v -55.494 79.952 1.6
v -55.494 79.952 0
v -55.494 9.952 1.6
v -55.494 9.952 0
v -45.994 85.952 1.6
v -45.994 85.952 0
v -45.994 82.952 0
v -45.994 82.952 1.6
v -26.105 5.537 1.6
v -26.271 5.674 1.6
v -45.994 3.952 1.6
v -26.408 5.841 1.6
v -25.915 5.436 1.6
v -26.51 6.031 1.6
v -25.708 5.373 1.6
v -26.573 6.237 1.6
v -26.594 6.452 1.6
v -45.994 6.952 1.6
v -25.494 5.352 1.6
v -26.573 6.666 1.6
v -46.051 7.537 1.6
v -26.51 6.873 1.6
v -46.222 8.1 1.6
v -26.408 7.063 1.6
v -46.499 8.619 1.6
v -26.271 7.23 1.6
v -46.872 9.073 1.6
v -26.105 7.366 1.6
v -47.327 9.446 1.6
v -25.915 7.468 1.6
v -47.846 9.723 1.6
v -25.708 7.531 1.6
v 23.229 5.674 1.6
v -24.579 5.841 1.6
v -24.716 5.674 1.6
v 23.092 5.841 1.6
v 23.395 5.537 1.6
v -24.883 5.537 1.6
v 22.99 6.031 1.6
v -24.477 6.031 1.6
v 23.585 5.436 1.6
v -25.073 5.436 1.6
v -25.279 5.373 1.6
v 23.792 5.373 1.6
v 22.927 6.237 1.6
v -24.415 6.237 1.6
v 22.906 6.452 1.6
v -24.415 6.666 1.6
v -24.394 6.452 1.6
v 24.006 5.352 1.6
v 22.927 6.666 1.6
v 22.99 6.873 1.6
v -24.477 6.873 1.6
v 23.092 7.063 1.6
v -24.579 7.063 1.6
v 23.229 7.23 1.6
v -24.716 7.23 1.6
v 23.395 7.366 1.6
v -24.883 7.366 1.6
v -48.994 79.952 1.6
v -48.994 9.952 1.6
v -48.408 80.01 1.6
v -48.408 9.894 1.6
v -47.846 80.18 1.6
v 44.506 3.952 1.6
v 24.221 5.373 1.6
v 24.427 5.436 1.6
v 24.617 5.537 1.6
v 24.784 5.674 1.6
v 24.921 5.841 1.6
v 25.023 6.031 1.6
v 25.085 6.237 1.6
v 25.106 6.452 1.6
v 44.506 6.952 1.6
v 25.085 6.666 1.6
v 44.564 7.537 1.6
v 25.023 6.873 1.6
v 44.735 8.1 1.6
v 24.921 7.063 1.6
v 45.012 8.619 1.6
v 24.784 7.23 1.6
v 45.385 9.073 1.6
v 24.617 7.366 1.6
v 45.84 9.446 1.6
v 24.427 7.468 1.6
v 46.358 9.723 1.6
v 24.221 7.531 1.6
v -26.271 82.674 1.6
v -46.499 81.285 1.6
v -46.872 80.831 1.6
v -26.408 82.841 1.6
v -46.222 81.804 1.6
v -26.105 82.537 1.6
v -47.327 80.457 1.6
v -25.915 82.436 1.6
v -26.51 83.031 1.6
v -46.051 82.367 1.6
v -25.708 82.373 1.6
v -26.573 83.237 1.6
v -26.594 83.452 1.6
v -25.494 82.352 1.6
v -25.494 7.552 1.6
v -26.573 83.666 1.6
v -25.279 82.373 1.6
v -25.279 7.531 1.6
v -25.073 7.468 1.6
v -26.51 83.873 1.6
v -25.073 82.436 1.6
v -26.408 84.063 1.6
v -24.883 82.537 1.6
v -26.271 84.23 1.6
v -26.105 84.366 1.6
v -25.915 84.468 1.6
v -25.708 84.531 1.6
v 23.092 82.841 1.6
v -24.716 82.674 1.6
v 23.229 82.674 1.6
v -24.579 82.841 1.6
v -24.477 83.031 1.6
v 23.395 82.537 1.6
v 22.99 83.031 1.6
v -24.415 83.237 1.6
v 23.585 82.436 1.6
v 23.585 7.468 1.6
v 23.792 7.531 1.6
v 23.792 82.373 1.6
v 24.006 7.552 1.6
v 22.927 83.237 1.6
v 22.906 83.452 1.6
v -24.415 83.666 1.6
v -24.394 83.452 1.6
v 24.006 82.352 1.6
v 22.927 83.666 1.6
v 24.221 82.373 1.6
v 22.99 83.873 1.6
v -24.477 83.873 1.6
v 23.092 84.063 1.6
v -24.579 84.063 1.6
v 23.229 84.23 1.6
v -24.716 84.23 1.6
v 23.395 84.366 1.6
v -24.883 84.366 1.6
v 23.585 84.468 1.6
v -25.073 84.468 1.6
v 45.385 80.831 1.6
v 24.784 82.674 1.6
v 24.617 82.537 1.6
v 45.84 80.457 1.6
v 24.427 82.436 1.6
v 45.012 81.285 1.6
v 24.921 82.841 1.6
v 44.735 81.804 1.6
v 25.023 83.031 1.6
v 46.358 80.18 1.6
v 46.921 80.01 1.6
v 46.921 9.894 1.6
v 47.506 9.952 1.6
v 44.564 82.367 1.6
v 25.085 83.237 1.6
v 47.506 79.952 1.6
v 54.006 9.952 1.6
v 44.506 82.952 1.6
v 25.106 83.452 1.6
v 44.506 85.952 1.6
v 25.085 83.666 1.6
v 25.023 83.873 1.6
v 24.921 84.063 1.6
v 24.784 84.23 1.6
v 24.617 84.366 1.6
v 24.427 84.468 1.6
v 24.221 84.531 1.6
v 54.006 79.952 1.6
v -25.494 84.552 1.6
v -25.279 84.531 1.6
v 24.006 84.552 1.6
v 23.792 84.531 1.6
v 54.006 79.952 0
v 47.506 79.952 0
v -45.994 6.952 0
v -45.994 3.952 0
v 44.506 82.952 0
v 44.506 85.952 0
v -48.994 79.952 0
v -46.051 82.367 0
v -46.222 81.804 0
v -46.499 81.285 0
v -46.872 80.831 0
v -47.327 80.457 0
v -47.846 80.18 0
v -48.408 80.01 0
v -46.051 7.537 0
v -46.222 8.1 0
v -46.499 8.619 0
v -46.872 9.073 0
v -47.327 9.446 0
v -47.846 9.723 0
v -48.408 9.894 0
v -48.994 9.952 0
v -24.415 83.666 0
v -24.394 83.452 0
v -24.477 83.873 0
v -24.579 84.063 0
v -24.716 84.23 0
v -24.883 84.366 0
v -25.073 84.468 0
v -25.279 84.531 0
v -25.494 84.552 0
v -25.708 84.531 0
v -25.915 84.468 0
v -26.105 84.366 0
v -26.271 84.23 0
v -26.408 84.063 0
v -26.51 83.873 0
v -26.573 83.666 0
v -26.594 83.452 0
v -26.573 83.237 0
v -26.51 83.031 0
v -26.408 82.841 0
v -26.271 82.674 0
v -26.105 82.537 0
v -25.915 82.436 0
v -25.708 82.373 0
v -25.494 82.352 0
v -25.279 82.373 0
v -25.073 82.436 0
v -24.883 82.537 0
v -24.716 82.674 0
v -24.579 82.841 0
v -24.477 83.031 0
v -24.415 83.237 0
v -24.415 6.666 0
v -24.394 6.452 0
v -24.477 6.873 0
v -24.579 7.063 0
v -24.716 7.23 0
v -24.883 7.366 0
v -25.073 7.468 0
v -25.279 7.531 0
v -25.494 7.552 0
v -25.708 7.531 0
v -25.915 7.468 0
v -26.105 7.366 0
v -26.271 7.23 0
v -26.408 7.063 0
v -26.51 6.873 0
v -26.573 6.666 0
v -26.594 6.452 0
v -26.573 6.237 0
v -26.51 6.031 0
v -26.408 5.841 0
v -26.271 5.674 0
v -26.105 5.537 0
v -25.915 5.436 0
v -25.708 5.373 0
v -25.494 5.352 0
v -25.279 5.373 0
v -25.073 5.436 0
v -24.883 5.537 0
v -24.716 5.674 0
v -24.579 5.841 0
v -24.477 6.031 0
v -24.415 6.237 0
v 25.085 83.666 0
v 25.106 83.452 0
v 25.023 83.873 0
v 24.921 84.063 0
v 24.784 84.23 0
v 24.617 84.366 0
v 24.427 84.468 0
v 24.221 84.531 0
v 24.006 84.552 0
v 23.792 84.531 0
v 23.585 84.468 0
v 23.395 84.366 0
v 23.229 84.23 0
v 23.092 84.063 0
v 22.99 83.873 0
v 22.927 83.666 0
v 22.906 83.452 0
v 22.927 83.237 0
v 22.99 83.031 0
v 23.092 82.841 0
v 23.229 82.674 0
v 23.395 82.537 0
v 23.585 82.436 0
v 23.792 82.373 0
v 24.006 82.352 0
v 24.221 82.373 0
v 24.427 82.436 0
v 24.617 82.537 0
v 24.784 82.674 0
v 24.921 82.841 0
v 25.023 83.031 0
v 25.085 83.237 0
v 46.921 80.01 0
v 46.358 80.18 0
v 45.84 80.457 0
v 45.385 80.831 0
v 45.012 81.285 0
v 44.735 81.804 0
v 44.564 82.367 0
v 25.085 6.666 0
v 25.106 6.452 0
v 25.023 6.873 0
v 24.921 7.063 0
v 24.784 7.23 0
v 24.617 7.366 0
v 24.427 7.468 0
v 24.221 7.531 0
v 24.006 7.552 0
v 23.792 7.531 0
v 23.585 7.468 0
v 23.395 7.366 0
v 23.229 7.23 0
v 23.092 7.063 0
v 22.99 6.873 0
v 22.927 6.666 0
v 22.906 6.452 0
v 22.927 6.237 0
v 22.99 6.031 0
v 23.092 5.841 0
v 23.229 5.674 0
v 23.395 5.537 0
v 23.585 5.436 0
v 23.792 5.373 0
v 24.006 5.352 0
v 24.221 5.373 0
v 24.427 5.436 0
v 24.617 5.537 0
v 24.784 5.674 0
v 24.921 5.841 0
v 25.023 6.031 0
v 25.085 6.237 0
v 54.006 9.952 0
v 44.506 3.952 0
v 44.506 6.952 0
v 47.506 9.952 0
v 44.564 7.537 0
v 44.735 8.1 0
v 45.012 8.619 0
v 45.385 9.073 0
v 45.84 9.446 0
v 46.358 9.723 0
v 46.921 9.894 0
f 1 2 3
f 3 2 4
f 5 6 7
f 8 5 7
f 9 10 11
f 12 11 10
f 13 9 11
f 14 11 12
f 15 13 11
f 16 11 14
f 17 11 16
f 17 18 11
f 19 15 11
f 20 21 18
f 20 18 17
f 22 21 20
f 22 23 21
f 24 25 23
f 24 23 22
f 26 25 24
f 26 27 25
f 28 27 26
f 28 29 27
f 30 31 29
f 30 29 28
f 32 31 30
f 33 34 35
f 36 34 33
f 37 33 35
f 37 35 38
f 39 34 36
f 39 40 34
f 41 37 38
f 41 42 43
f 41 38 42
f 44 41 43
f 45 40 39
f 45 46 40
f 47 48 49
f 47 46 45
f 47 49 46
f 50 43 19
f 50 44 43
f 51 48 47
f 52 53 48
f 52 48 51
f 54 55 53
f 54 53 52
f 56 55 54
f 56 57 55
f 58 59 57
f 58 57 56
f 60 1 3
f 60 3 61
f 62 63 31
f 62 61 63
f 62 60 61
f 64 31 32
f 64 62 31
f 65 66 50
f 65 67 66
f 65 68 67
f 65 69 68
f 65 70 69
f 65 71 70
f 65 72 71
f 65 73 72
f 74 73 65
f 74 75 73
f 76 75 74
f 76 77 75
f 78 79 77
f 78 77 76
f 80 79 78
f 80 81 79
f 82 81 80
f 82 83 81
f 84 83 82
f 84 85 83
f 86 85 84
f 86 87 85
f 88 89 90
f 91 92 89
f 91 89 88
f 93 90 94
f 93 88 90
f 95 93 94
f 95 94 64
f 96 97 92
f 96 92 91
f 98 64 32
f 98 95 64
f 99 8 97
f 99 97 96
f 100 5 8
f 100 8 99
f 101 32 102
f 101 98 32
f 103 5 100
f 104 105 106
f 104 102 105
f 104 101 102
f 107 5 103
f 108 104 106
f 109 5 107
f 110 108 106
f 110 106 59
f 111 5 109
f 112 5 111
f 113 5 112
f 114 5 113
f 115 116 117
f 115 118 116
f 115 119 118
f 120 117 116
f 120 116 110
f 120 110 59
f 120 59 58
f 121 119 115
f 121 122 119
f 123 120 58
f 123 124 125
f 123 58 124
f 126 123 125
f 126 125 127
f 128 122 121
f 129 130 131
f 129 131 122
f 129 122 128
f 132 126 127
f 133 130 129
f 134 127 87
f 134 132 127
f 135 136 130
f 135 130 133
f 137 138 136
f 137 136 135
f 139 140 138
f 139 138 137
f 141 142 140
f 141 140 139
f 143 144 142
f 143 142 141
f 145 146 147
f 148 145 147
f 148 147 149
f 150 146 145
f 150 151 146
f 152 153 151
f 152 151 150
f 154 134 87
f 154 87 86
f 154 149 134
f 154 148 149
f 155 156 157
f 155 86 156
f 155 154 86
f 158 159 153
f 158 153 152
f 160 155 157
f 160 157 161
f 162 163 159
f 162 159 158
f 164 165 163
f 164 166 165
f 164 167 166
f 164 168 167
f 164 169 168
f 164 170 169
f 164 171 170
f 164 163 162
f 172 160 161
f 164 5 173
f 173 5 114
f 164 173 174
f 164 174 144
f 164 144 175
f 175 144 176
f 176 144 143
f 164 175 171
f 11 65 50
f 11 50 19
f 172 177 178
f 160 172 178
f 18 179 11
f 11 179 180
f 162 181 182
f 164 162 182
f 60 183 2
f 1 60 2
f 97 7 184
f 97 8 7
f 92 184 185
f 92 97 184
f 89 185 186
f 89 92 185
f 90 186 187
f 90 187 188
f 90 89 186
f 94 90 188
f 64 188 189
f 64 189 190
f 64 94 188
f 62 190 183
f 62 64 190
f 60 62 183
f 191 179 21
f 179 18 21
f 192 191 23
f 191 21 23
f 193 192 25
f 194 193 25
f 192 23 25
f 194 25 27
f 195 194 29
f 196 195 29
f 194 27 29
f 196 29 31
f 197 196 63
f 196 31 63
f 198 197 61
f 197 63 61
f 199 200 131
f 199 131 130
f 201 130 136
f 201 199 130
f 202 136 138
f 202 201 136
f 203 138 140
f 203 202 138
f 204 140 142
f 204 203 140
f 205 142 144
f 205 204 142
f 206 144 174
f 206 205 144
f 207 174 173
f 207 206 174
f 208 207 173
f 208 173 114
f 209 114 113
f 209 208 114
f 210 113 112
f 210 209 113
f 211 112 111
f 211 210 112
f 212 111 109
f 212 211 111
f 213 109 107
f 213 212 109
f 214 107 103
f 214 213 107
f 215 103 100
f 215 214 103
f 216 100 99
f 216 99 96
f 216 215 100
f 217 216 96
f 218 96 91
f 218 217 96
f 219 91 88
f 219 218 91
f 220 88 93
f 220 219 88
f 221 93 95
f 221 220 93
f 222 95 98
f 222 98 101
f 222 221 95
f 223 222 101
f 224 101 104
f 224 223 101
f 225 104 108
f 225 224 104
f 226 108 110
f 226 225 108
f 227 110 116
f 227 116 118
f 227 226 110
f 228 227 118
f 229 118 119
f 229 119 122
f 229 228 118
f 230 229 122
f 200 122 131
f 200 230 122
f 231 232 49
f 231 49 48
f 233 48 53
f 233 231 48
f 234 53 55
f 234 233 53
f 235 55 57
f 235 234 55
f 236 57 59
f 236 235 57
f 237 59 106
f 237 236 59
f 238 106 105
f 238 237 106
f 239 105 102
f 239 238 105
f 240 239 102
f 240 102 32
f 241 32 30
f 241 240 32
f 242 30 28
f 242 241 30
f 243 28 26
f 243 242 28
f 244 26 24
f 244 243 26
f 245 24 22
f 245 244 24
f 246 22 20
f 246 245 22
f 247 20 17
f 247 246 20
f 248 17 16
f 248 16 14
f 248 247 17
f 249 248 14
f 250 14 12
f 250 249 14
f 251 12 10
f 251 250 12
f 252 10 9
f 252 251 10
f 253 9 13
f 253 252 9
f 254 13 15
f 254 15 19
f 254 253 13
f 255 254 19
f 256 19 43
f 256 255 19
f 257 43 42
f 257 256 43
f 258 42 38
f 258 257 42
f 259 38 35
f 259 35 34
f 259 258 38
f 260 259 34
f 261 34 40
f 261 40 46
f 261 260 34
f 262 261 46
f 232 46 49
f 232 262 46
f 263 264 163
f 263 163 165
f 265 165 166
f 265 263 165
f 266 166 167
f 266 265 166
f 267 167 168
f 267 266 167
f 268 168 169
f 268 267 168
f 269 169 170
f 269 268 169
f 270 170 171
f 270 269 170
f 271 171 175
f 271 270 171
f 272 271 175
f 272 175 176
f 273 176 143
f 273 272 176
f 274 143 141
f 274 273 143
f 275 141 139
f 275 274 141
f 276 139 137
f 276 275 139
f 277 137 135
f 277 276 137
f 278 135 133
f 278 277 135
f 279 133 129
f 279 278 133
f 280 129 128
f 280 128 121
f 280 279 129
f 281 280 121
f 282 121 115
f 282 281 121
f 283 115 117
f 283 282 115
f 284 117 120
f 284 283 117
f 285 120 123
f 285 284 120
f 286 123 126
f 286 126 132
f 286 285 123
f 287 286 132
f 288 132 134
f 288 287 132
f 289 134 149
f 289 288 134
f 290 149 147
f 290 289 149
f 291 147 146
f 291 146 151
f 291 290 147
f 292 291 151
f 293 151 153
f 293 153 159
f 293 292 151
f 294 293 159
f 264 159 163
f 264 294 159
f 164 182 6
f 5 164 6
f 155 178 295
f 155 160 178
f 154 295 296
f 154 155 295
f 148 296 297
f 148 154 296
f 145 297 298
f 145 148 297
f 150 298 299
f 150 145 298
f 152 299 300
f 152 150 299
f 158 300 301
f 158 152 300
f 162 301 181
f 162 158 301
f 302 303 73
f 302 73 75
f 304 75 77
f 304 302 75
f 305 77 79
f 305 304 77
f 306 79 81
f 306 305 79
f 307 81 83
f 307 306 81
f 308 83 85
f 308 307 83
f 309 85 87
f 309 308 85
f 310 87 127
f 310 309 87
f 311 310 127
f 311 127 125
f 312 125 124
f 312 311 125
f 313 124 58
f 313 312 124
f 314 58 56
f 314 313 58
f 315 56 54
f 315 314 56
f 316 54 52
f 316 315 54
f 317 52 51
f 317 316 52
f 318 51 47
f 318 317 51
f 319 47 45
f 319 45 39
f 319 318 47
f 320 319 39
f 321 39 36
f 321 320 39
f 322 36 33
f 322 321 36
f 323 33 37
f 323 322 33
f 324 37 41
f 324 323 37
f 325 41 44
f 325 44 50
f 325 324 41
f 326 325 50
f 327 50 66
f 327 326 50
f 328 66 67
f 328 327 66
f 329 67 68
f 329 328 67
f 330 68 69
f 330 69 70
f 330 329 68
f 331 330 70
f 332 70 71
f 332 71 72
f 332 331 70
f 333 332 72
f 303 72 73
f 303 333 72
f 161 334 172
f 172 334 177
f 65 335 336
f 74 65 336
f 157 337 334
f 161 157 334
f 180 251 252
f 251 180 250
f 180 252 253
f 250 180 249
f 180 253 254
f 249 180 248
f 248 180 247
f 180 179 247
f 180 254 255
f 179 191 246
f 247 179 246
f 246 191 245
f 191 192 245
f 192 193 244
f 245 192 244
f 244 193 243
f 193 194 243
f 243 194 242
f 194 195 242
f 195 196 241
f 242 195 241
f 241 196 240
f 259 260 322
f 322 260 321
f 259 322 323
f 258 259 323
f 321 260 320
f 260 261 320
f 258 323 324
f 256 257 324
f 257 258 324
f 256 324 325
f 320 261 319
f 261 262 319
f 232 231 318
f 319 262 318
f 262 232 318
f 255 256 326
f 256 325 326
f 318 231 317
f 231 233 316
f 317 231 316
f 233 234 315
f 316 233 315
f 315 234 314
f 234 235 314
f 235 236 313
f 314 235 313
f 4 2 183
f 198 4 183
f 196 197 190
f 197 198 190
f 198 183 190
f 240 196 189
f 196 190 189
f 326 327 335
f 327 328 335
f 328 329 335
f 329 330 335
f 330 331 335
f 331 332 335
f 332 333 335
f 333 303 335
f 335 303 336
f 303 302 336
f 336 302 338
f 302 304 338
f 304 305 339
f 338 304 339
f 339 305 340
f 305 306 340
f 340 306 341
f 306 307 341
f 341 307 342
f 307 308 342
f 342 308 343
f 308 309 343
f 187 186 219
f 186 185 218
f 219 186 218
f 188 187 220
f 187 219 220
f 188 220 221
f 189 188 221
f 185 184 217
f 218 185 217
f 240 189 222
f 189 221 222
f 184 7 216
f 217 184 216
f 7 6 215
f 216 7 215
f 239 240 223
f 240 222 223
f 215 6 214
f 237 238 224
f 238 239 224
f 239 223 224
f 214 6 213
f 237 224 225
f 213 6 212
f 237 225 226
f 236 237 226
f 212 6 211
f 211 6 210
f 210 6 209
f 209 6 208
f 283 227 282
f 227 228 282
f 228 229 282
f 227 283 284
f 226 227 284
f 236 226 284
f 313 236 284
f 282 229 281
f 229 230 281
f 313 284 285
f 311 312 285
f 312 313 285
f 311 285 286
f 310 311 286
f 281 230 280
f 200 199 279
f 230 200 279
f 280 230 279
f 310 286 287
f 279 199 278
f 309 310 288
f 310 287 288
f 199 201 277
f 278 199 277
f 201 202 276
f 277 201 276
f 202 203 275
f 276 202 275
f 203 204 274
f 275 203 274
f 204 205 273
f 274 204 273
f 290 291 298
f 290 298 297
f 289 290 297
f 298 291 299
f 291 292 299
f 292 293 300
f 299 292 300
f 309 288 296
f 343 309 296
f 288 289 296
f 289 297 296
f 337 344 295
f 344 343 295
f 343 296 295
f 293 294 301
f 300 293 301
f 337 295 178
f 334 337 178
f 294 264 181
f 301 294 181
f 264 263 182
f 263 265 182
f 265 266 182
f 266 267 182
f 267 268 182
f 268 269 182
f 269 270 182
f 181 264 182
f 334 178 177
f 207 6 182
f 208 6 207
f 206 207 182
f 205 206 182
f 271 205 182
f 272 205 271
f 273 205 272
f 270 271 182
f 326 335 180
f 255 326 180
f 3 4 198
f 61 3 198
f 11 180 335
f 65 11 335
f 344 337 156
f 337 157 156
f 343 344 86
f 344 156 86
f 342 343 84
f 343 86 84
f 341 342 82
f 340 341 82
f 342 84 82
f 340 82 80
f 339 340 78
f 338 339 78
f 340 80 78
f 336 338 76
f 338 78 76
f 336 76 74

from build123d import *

# Parameters (mm, degrees)
SKETCH1_R           = 1.1
BOSS_EXTRUDE1_DEPTH = 1.6
FILLET1_R           = 3


with BuildPart() as part:
    # Sketch1 → Boss-Extrude1 (new body)
    with BuildSketch(Plane.XY):
        Polygon((54.006358498, 79.95185693), (44.506358498, 79.95185693), (44.506358498, 85.95185693), (-45.993641502, 85.95185693), (-45.993641502, 79.95185693), (-55.493641502, 79.95185693), (-55.493641502, 9.95185693), (-45.993641502, 9.95185693), (-45.993641502, 3.95185693), (44.506358498, 3.95185693), (44.506358498, 9.95185693), (54.006358498, 9.95185693), align=None)
        with Locations((-25.493641502, 83.45185693)):
            Circle(SKETCH1_R, mode=Mode.SUBTRACT)
        with Locations((24.006358498, 83.45185693)):
            Circle(SKETCH1_R, mode=Mode.SUBTRACT)
        with Locations((24.006358498, 6.45185693)):
            Circle(SKETCH1_R, mode=Mode.SUBTRACT)
        with Locations((-25.493641502, 6.45185693)):
            Circle(SKETCH1_R, mode=Mode.SUBTRACT)
    extrude(amount=BOSS_EXTRUDE1_DEPTH)

    # Fillet1
    fillet1_edges = [part.edges().sort_by_distance(p)[0] for p in [
        (44.506358498, 9.95185693, 0.8),
        (-45.993641502, 9.95185693, 0.8),
        (-45.993641502, 79.95185693, 0.8),
        (44.506358498, 79.95185693, 0.8),
    ]]
    fillet(fillet1_edges, radius=FILLET1_R)


solid = part.part
